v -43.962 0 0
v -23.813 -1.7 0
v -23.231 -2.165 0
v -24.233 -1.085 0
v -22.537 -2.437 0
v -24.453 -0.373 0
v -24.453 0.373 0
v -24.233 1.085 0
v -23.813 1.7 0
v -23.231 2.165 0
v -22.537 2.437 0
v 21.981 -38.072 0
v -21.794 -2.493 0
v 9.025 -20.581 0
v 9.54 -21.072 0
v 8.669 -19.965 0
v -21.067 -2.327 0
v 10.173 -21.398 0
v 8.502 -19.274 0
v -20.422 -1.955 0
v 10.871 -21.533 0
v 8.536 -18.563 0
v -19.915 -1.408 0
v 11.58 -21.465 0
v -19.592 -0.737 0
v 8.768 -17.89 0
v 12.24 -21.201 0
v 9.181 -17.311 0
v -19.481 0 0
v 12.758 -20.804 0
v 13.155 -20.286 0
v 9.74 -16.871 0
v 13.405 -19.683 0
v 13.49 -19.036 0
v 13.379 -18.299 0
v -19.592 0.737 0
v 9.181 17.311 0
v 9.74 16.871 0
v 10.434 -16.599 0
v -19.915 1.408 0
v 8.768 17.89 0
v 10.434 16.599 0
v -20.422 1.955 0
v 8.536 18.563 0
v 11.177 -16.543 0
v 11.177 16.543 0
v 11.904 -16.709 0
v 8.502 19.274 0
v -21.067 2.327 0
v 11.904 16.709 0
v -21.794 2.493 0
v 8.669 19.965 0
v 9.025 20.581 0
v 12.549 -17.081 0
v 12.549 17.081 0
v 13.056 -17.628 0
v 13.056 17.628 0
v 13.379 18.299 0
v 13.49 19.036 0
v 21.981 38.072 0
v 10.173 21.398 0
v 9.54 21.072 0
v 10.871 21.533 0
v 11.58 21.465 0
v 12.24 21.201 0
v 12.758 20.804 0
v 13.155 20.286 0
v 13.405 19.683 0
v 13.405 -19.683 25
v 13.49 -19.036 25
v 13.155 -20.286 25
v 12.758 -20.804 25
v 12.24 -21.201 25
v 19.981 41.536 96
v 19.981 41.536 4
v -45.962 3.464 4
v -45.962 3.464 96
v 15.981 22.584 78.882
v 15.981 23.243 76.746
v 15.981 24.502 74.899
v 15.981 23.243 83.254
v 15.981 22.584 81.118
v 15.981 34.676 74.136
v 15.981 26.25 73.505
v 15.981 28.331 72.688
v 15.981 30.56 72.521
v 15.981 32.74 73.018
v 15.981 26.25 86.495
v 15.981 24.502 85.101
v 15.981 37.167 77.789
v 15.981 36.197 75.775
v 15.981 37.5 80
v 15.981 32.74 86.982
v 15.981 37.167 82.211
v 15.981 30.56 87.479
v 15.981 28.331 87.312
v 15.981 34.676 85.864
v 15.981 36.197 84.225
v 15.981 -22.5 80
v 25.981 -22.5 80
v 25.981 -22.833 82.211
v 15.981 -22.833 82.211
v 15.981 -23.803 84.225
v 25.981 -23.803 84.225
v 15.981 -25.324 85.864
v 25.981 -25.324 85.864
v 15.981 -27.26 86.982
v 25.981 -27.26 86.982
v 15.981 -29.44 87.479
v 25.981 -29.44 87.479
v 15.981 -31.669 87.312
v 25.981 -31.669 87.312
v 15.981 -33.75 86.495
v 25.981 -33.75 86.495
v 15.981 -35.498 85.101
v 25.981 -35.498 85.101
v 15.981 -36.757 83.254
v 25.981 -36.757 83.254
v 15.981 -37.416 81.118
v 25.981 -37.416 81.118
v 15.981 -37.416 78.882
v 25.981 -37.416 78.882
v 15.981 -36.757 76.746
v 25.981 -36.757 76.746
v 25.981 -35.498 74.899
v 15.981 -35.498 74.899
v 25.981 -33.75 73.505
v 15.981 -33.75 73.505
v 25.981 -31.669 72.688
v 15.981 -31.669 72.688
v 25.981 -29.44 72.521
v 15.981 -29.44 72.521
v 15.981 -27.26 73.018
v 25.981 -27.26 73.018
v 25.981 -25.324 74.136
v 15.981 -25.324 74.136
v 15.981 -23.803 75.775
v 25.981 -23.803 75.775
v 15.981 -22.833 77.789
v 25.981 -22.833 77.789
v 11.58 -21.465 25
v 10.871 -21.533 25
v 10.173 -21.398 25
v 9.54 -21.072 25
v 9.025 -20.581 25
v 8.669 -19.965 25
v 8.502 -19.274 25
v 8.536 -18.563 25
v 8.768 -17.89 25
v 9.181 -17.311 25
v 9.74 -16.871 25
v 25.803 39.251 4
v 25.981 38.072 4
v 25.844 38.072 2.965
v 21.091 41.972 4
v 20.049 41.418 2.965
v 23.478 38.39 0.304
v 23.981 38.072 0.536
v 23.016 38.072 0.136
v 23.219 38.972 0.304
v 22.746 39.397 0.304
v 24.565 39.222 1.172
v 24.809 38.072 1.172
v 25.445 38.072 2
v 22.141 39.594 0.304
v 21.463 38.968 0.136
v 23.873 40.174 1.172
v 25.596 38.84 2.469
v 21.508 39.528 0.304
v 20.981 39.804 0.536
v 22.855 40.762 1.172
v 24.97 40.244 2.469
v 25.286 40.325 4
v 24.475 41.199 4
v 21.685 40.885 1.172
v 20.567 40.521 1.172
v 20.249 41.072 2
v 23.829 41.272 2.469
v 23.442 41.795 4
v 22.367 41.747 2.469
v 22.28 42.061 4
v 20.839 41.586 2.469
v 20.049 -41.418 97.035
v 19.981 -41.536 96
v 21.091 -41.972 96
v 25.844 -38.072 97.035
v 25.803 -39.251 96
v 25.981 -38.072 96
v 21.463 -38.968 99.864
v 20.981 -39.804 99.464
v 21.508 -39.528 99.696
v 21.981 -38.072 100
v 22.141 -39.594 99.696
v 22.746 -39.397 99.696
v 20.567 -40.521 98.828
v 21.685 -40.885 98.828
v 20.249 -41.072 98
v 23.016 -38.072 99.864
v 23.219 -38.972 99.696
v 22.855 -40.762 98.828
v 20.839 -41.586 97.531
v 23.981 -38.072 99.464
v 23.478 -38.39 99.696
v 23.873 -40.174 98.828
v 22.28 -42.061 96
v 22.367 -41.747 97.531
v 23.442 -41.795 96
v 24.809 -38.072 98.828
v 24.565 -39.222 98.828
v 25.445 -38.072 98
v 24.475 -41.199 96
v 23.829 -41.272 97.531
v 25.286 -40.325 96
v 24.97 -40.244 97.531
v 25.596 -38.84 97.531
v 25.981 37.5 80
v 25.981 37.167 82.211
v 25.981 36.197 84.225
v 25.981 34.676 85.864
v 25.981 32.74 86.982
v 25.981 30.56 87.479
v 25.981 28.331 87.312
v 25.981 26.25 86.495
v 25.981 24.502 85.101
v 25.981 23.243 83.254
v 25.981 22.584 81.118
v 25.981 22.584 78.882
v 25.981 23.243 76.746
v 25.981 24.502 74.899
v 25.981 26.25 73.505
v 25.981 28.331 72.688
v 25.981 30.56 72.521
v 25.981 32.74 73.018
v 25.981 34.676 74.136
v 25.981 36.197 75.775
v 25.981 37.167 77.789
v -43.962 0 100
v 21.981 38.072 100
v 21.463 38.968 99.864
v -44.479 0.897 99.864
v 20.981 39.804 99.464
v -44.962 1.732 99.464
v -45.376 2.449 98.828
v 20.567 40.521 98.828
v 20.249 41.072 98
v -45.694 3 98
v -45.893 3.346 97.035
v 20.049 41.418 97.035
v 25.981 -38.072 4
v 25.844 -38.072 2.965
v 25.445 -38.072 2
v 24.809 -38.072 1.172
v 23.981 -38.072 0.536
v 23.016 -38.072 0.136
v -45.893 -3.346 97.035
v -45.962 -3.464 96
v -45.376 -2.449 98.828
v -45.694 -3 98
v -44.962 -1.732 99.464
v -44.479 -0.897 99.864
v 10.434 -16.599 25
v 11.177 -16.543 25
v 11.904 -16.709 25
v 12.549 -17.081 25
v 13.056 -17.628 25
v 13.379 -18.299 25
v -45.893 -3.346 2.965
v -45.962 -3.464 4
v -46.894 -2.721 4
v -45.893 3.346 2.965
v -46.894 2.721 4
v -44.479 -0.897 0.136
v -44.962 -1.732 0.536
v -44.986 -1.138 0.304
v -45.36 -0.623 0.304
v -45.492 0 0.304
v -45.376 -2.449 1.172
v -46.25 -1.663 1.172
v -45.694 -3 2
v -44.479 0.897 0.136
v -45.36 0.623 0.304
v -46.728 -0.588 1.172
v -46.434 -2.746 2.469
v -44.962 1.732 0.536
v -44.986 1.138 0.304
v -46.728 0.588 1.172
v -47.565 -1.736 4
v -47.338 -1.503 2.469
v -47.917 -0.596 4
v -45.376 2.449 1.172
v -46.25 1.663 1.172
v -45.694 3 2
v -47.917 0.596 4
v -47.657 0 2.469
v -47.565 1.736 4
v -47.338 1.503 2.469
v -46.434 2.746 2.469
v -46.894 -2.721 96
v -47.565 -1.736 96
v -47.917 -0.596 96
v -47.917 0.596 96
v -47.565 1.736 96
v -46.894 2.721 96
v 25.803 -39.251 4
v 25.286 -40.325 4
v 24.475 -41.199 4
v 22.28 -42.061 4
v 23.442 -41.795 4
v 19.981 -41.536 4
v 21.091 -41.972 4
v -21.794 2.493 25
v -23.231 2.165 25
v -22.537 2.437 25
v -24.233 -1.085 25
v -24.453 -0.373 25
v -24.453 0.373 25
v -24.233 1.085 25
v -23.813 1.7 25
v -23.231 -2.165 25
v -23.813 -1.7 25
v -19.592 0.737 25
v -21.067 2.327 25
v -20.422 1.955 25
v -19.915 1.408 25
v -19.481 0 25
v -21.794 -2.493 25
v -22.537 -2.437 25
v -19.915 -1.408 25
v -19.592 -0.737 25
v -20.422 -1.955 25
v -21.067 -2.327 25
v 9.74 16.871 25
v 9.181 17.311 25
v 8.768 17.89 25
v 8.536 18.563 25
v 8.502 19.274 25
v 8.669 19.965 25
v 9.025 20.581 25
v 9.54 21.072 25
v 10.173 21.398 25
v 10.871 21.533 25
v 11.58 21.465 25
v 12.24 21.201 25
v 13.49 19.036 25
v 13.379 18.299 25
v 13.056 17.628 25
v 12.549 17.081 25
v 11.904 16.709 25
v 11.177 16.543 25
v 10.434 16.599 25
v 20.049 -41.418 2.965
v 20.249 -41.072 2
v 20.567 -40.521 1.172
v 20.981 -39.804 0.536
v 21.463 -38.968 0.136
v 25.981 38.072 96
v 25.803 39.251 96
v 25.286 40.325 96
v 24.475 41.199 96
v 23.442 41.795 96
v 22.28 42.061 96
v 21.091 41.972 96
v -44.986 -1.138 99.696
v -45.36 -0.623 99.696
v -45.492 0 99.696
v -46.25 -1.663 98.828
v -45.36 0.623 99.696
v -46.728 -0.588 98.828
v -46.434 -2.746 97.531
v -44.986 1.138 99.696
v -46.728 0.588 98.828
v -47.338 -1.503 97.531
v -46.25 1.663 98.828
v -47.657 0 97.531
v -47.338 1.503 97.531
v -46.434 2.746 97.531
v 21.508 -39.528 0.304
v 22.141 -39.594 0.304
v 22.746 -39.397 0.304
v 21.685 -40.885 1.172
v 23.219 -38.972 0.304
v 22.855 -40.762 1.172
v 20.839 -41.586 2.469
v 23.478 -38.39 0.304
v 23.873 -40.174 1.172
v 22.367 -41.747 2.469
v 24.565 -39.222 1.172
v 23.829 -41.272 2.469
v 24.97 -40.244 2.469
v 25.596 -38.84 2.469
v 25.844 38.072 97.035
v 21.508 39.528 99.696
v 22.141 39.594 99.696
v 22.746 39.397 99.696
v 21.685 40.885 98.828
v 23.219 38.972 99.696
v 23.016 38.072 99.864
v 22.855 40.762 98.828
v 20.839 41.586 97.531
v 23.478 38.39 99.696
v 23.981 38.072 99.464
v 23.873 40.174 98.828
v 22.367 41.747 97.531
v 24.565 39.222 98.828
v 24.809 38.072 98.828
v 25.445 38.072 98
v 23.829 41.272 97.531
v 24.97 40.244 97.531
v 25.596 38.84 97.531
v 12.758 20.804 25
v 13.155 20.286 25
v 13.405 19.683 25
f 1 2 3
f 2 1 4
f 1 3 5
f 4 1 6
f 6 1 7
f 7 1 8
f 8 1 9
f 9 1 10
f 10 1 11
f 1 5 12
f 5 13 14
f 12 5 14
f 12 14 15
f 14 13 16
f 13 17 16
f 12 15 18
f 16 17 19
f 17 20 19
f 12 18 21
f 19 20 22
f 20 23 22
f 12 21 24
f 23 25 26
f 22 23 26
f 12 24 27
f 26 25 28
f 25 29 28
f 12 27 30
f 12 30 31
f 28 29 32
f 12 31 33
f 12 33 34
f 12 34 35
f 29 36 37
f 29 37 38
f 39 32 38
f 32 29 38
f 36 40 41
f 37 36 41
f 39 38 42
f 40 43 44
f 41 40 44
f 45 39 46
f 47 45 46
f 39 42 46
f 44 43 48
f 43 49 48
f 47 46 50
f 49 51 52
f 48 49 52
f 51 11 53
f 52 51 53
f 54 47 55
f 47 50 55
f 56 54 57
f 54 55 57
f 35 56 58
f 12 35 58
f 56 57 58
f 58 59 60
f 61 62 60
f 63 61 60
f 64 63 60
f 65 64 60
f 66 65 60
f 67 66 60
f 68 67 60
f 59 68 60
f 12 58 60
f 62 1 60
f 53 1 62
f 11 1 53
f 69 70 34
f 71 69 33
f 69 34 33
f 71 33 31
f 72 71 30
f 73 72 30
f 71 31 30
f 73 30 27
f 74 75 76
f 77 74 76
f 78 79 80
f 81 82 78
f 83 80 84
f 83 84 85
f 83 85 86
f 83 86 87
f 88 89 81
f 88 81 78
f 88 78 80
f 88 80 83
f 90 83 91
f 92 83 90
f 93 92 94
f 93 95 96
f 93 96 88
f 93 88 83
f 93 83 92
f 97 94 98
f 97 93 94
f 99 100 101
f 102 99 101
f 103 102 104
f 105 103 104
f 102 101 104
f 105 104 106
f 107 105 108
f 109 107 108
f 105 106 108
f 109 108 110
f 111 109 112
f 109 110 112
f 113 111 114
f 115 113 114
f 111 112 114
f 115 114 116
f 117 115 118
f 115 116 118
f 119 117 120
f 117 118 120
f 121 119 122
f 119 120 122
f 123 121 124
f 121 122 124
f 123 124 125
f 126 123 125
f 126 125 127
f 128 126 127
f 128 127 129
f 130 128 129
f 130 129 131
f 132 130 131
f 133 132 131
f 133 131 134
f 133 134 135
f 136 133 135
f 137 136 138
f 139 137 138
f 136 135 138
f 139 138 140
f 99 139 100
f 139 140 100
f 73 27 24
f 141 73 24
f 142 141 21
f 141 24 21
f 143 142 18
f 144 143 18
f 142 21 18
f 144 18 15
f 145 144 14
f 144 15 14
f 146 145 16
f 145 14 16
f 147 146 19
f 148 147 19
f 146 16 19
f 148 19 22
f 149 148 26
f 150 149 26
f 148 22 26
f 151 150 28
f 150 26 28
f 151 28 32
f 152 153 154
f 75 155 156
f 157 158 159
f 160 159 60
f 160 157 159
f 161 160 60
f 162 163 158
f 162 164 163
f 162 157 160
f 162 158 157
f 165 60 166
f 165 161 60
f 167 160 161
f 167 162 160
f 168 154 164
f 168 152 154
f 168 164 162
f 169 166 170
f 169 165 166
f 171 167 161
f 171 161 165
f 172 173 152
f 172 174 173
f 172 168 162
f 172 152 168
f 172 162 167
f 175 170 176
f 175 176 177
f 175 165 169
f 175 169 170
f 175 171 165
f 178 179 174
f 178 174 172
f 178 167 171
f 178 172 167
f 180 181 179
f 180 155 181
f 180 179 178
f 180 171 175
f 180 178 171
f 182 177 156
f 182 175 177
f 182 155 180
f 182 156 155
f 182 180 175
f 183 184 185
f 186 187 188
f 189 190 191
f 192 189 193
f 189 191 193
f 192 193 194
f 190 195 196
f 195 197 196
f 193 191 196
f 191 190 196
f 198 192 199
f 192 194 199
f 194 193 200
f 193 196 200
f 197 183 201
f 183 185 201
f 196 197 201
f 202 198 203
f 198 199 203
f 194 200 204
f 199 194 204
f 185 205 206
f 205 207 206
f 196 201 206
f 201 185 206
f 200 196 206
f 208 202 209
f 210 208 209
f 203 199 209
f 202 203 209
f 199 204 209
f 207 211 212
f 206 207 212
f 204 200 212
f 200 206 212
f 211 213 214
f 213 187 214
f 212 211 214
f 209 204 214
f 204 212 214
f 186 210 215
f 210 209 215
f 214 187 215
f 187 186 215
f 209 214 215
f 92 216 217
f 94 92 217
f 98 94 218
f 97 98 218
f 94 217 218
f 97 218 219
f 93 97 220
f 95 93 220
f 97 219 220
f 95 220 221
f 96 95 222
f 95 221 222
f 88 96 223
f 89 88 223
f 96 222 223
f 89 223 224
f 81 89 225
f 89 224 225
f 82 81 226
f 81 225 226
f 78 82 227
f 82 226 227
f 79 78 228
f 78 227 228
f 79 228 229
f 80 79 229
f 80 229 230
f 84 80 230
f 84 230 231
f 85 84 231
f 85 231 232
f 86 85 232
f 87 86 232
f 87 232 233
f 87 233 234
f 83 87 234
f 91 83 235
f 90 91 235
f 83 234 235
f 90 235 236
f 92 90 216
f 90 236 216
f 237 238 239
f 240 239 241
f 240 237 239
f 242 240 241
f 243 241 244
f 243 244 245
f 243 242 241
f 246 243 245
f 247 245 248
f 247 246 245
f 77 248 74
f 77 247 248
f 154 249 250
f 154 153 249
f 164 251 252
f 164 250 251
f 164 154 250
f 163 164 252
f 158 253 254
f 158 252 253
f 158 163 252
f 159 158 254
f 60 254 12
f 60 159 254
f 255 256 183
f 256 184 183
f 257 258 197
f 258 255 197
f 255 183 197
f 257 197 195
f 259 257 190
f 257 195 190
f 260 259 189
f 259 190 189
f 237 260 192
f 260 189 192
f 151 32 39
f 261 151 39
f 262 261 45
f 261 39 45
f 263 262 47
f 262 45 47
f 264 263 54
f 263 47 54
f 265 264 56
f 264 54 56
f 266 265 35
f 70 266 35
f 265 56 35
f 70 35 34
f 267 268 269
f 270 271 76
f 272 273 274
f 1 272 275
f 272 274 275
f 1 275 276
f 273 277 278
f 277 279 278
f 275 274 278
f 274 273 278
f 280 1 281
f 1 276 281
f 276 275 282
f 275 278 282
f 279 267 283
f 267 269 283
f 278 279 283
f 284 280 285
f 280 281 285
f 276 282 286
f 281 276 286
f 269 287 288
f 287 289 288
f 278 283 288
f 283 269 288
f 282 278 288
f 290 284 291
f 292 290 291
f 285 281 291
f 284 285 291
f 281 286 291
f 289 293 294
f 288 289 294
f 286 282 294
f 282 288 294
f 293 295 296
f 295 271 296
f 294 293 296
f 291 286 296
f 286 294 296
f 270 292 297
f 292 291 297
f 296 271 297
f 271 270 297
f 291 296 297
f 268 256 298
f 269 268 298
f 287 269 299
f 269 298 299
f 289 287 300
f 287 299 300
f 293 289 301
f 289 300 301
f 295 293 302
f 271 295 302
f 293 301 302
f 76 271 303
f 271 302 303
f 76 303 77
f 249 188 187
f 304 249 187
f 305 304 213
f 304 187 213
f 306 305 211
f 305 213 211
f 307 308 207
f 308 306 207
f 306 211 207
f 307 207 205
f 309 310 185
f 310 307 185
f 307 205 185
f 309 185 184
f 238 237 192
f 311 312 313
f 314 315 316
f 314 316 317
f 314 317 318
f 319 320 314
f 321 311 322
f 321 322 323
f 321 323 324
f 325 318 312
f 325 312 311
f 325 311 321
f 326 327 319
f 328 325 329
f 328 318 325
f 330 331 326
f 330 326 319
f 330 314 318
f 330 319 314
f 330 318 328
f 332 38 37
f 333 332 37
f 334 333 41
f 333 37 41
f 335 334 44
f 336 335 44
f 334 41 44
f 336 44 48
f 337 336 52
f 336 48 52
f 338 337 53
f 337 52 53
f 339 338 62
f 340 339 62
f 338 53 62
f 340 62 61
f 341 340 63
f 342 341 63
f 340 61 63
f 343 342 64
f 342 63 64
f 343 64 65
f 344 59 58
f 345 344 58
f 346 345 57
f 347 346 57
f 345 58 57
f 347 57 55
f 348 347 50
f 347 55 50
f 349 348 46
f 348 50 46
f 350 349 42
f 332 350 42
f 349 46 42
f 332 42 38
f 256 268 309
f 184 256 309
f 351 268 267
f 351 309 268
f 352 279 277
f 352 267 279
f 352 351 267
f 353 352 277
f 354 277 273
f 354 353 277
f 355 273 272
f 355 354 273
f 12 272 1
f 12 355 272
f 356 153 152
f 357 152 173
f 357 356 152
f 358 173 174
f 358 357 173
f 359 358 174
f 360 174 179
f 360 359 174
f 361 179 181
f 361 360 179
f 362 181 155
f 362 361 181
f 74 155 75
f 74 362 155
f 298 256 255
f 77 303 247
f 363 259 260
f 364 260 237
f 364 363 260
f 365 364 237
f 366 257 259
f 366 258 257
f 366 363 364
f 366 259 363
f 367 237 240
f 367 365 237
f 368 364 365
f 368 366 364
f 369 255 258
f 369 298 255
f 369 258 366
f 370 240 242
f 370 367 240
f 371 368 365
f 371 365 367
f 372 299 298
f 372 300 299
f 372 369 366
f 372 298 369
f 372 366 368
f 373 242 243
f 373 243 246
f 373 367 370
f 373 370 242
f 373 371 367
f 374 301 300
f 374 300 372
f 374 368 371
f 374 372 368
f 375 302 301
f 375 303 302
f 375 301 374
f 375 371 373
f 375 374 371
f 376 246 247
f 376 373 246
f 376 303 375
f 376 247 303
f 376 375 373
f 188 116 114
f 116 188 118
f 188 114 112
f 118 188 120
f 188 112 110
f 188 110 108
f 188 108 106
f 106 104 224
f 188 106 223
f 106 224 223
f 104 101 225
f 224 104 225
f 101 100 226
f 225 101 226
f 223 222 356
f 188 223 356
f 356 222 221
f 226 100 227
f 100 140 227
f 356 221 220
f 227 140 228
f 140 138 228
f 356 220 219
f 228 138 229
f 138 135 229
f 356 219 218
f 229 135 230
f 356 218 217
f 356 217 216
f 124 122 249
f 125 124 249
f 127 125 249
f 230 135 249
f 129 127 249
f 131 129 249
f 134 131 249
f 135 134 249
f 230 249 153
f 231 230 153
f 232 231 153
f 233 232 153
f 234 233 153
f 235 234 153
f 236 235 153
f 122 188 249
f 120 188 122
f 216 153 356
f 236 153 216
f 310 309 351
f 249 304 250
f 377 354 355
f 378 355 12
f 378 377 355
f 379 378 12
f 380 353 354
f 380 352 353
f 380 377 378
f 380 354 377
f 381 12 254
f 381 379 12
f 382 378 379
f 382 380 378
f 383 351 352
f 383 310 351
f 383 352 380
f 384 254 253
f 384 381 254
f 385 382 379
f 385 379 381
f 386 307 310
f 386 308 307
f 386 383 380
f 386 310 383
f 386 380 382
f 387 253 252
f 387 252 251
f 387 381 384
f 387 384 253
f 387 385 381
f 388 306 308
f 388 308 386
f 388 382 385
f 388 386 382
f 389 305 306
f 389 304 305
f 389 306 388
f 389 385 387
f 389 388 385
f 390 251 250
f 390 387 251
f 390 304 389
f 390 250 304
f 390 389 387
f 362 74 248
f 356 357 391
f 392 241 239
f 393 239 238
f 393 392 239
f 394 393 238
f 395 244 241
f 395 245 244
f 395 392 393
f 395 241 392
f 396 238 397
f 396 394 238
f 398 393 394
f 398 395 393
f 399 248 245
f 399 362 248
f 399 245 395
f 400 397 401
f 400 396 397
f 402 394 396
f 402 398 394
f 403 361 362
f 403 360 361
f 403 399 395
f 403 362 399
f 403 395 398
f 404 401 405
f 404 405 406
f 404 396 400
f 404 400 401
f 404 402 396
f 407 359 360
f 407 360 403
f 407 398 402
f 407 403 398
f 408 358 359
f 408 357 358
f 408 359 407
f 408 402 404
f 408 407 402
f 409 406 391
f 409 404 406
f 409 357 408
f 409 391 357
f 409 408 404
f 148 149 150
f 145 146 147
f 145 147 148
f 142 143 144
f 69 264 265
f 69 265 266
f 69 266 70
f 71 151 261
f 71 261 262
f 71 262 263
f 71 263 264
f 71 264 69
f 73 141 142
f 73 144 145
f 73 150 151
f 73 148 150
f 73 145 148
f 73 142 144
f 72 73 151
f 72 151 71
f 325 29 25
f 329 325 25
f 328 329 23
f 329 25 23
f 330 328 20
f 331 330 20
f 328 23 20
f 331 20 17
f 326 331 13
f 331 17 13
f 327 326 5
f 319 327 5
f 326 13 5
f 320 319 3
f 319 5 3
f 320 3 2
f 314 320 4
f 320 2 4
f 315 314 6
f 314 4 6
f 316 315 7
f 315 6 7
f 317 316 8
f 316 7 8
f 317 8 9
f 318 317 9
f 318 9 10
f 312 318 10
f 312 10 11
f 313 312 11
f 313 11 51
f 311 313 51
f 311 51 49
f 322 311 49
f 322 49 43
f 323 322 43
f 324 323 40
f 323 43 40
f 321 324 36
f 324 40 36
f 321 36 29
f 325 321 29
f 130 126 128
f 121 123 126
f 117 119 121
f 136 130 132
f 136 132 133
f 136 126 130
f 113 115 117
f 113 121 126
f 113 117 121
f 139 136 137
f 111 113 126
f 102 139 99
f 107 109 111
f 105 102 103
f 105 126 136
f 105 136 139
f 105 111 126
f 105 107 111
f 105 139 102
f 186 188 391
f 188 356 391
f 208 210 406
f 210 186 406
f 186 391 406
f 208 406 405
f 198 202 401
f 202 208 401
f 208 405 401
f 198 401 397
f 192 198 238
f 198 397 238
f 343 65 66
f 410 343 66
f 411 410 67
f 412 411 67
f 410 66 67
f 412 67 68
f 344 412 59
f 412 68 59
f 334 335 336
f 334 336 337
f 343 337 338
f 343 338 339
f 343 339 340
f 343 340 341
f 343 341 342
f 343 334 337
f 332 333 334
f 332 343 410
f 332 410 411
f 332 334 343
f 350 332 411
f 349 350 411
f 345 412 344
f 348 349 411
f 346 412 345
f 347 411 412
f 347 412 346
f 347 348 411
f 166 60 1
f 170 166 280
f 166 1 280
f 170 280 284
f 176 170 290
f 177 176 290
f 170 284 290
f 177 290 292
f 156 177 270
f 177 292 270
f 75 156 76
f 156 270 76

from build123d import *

# Parameters (mm, degrees)
F1_DEPTH = 100
F2_R     = 7.5
F3_DEPTH = 10
F4_R     = 4
F6_DEPTH = 25


with BuildPart() as f1:
    # F0 (on Top) → F1 (new body)
    with BuildSketch(Plane.XY):
        Polygon((25.9807621135, -45), (25.9807621135, 45), (-51.9615242271, 0), align=None)
    extrude(amount=F1_DEPTH)

    # F2 (on face) → F3 (cut)
    with BuildSketch(Plane.YZ.offset(25.9807621135)):
        with Locations((-30, 80)):
            Circle(F2_R)
        with Locations((30, 80)):
            Circle(F2_R)
    extrude(amount=-F3_DEPTH, mode=Mode.SUBTRACT)

    # F4
    f4_edges = [f1.edges().sort_by_distance(p)[0] for p in [
        (25.980762, -45, 50),
        (25.980762, 45, 50),
        (-51.961524, 0, 50),
        (-12.990381, -22.5, 100),
        (-12.990381, 22.5, 100),
        (25.980762, 0, 100),
        (-12.990381, -22.5, 0),
        (25.980762, 0, 0),
        (-12.990381, 22.5, 0),
    ]]
    fillet(f4_edges, radius=F4_R)

    # F5 (on face) → F6 (cut)
    with BuildSketch(Plane(origin=(0, 0, 0), x_dir=(1, 0, 0), z_dir=(0, 0, -1))):
        with BuildLine():
            Line((12.2403810568, -21.2009618943), (9.7403810568, -16.8708348754))
            ThreePointArc((9.7403810568, -16.8708348754), (8.8253175473, -20.2858983849), (12.2403810568, -21.2009618943))
        make_face()
        with BuildLine():
            ThreePointArc((13.4903810568, -19.0358983849), (12.2403810568, -16.8708348754), (9.7403810568, -16.8708348754))
            Line((9.7403810568, -16.8708348754), (12.2403810568, -21.2009618943))
            ThreePointArc((12.2403810568, -21.2009618943), (13.1554445662, -20.2858983849), (13.4903810568, -19.0358983849))
        make_face()
        with BuildLine():
            ThreePointArc((-24.4807621135, 0), (-21.9807621135, -2.5), (-19.4807621135, 0))
            Line((-19.4807621135, 0), (-24.4807621135, 0))
        make_face()
        with BuildLine():
            Line((-24.4807621135, 0), (-19.4807621135, 0))
            ThreePointArc((-19.4807621135, 0), (-21.9807621135, 2.5), (-24.4807621135, 0))
        make_face()
        with BuildLine():
            ThreePointArc((12.2403810568, 21.2009618943), (8.8253175473, 20.2858983849), (9.7403810568, 16.8708348754))
            Line((9.7403810568, 16.8708348754), (12.2403810568, 21.2009618943))
        make_face()
        with BuildLine():
            Line((12.2403810568, 21.2009618943), (9.7403810568, 16.8708348754))
            ThreePointArc((9.7403810568, 16.8708348754), (12.2403810568, 16.8708348754), (13.4903810568, 19.0358983849))
            ThreePointArc((13.4903810568, 19.0358983849), (13.1554445662, 20.2858983849), (12.2403810568, 21.2009618943))
        make_face()
    extrude(amount=-F6_DEPTH, mode=Mode.SUBTRACT)


solid = f1.part
